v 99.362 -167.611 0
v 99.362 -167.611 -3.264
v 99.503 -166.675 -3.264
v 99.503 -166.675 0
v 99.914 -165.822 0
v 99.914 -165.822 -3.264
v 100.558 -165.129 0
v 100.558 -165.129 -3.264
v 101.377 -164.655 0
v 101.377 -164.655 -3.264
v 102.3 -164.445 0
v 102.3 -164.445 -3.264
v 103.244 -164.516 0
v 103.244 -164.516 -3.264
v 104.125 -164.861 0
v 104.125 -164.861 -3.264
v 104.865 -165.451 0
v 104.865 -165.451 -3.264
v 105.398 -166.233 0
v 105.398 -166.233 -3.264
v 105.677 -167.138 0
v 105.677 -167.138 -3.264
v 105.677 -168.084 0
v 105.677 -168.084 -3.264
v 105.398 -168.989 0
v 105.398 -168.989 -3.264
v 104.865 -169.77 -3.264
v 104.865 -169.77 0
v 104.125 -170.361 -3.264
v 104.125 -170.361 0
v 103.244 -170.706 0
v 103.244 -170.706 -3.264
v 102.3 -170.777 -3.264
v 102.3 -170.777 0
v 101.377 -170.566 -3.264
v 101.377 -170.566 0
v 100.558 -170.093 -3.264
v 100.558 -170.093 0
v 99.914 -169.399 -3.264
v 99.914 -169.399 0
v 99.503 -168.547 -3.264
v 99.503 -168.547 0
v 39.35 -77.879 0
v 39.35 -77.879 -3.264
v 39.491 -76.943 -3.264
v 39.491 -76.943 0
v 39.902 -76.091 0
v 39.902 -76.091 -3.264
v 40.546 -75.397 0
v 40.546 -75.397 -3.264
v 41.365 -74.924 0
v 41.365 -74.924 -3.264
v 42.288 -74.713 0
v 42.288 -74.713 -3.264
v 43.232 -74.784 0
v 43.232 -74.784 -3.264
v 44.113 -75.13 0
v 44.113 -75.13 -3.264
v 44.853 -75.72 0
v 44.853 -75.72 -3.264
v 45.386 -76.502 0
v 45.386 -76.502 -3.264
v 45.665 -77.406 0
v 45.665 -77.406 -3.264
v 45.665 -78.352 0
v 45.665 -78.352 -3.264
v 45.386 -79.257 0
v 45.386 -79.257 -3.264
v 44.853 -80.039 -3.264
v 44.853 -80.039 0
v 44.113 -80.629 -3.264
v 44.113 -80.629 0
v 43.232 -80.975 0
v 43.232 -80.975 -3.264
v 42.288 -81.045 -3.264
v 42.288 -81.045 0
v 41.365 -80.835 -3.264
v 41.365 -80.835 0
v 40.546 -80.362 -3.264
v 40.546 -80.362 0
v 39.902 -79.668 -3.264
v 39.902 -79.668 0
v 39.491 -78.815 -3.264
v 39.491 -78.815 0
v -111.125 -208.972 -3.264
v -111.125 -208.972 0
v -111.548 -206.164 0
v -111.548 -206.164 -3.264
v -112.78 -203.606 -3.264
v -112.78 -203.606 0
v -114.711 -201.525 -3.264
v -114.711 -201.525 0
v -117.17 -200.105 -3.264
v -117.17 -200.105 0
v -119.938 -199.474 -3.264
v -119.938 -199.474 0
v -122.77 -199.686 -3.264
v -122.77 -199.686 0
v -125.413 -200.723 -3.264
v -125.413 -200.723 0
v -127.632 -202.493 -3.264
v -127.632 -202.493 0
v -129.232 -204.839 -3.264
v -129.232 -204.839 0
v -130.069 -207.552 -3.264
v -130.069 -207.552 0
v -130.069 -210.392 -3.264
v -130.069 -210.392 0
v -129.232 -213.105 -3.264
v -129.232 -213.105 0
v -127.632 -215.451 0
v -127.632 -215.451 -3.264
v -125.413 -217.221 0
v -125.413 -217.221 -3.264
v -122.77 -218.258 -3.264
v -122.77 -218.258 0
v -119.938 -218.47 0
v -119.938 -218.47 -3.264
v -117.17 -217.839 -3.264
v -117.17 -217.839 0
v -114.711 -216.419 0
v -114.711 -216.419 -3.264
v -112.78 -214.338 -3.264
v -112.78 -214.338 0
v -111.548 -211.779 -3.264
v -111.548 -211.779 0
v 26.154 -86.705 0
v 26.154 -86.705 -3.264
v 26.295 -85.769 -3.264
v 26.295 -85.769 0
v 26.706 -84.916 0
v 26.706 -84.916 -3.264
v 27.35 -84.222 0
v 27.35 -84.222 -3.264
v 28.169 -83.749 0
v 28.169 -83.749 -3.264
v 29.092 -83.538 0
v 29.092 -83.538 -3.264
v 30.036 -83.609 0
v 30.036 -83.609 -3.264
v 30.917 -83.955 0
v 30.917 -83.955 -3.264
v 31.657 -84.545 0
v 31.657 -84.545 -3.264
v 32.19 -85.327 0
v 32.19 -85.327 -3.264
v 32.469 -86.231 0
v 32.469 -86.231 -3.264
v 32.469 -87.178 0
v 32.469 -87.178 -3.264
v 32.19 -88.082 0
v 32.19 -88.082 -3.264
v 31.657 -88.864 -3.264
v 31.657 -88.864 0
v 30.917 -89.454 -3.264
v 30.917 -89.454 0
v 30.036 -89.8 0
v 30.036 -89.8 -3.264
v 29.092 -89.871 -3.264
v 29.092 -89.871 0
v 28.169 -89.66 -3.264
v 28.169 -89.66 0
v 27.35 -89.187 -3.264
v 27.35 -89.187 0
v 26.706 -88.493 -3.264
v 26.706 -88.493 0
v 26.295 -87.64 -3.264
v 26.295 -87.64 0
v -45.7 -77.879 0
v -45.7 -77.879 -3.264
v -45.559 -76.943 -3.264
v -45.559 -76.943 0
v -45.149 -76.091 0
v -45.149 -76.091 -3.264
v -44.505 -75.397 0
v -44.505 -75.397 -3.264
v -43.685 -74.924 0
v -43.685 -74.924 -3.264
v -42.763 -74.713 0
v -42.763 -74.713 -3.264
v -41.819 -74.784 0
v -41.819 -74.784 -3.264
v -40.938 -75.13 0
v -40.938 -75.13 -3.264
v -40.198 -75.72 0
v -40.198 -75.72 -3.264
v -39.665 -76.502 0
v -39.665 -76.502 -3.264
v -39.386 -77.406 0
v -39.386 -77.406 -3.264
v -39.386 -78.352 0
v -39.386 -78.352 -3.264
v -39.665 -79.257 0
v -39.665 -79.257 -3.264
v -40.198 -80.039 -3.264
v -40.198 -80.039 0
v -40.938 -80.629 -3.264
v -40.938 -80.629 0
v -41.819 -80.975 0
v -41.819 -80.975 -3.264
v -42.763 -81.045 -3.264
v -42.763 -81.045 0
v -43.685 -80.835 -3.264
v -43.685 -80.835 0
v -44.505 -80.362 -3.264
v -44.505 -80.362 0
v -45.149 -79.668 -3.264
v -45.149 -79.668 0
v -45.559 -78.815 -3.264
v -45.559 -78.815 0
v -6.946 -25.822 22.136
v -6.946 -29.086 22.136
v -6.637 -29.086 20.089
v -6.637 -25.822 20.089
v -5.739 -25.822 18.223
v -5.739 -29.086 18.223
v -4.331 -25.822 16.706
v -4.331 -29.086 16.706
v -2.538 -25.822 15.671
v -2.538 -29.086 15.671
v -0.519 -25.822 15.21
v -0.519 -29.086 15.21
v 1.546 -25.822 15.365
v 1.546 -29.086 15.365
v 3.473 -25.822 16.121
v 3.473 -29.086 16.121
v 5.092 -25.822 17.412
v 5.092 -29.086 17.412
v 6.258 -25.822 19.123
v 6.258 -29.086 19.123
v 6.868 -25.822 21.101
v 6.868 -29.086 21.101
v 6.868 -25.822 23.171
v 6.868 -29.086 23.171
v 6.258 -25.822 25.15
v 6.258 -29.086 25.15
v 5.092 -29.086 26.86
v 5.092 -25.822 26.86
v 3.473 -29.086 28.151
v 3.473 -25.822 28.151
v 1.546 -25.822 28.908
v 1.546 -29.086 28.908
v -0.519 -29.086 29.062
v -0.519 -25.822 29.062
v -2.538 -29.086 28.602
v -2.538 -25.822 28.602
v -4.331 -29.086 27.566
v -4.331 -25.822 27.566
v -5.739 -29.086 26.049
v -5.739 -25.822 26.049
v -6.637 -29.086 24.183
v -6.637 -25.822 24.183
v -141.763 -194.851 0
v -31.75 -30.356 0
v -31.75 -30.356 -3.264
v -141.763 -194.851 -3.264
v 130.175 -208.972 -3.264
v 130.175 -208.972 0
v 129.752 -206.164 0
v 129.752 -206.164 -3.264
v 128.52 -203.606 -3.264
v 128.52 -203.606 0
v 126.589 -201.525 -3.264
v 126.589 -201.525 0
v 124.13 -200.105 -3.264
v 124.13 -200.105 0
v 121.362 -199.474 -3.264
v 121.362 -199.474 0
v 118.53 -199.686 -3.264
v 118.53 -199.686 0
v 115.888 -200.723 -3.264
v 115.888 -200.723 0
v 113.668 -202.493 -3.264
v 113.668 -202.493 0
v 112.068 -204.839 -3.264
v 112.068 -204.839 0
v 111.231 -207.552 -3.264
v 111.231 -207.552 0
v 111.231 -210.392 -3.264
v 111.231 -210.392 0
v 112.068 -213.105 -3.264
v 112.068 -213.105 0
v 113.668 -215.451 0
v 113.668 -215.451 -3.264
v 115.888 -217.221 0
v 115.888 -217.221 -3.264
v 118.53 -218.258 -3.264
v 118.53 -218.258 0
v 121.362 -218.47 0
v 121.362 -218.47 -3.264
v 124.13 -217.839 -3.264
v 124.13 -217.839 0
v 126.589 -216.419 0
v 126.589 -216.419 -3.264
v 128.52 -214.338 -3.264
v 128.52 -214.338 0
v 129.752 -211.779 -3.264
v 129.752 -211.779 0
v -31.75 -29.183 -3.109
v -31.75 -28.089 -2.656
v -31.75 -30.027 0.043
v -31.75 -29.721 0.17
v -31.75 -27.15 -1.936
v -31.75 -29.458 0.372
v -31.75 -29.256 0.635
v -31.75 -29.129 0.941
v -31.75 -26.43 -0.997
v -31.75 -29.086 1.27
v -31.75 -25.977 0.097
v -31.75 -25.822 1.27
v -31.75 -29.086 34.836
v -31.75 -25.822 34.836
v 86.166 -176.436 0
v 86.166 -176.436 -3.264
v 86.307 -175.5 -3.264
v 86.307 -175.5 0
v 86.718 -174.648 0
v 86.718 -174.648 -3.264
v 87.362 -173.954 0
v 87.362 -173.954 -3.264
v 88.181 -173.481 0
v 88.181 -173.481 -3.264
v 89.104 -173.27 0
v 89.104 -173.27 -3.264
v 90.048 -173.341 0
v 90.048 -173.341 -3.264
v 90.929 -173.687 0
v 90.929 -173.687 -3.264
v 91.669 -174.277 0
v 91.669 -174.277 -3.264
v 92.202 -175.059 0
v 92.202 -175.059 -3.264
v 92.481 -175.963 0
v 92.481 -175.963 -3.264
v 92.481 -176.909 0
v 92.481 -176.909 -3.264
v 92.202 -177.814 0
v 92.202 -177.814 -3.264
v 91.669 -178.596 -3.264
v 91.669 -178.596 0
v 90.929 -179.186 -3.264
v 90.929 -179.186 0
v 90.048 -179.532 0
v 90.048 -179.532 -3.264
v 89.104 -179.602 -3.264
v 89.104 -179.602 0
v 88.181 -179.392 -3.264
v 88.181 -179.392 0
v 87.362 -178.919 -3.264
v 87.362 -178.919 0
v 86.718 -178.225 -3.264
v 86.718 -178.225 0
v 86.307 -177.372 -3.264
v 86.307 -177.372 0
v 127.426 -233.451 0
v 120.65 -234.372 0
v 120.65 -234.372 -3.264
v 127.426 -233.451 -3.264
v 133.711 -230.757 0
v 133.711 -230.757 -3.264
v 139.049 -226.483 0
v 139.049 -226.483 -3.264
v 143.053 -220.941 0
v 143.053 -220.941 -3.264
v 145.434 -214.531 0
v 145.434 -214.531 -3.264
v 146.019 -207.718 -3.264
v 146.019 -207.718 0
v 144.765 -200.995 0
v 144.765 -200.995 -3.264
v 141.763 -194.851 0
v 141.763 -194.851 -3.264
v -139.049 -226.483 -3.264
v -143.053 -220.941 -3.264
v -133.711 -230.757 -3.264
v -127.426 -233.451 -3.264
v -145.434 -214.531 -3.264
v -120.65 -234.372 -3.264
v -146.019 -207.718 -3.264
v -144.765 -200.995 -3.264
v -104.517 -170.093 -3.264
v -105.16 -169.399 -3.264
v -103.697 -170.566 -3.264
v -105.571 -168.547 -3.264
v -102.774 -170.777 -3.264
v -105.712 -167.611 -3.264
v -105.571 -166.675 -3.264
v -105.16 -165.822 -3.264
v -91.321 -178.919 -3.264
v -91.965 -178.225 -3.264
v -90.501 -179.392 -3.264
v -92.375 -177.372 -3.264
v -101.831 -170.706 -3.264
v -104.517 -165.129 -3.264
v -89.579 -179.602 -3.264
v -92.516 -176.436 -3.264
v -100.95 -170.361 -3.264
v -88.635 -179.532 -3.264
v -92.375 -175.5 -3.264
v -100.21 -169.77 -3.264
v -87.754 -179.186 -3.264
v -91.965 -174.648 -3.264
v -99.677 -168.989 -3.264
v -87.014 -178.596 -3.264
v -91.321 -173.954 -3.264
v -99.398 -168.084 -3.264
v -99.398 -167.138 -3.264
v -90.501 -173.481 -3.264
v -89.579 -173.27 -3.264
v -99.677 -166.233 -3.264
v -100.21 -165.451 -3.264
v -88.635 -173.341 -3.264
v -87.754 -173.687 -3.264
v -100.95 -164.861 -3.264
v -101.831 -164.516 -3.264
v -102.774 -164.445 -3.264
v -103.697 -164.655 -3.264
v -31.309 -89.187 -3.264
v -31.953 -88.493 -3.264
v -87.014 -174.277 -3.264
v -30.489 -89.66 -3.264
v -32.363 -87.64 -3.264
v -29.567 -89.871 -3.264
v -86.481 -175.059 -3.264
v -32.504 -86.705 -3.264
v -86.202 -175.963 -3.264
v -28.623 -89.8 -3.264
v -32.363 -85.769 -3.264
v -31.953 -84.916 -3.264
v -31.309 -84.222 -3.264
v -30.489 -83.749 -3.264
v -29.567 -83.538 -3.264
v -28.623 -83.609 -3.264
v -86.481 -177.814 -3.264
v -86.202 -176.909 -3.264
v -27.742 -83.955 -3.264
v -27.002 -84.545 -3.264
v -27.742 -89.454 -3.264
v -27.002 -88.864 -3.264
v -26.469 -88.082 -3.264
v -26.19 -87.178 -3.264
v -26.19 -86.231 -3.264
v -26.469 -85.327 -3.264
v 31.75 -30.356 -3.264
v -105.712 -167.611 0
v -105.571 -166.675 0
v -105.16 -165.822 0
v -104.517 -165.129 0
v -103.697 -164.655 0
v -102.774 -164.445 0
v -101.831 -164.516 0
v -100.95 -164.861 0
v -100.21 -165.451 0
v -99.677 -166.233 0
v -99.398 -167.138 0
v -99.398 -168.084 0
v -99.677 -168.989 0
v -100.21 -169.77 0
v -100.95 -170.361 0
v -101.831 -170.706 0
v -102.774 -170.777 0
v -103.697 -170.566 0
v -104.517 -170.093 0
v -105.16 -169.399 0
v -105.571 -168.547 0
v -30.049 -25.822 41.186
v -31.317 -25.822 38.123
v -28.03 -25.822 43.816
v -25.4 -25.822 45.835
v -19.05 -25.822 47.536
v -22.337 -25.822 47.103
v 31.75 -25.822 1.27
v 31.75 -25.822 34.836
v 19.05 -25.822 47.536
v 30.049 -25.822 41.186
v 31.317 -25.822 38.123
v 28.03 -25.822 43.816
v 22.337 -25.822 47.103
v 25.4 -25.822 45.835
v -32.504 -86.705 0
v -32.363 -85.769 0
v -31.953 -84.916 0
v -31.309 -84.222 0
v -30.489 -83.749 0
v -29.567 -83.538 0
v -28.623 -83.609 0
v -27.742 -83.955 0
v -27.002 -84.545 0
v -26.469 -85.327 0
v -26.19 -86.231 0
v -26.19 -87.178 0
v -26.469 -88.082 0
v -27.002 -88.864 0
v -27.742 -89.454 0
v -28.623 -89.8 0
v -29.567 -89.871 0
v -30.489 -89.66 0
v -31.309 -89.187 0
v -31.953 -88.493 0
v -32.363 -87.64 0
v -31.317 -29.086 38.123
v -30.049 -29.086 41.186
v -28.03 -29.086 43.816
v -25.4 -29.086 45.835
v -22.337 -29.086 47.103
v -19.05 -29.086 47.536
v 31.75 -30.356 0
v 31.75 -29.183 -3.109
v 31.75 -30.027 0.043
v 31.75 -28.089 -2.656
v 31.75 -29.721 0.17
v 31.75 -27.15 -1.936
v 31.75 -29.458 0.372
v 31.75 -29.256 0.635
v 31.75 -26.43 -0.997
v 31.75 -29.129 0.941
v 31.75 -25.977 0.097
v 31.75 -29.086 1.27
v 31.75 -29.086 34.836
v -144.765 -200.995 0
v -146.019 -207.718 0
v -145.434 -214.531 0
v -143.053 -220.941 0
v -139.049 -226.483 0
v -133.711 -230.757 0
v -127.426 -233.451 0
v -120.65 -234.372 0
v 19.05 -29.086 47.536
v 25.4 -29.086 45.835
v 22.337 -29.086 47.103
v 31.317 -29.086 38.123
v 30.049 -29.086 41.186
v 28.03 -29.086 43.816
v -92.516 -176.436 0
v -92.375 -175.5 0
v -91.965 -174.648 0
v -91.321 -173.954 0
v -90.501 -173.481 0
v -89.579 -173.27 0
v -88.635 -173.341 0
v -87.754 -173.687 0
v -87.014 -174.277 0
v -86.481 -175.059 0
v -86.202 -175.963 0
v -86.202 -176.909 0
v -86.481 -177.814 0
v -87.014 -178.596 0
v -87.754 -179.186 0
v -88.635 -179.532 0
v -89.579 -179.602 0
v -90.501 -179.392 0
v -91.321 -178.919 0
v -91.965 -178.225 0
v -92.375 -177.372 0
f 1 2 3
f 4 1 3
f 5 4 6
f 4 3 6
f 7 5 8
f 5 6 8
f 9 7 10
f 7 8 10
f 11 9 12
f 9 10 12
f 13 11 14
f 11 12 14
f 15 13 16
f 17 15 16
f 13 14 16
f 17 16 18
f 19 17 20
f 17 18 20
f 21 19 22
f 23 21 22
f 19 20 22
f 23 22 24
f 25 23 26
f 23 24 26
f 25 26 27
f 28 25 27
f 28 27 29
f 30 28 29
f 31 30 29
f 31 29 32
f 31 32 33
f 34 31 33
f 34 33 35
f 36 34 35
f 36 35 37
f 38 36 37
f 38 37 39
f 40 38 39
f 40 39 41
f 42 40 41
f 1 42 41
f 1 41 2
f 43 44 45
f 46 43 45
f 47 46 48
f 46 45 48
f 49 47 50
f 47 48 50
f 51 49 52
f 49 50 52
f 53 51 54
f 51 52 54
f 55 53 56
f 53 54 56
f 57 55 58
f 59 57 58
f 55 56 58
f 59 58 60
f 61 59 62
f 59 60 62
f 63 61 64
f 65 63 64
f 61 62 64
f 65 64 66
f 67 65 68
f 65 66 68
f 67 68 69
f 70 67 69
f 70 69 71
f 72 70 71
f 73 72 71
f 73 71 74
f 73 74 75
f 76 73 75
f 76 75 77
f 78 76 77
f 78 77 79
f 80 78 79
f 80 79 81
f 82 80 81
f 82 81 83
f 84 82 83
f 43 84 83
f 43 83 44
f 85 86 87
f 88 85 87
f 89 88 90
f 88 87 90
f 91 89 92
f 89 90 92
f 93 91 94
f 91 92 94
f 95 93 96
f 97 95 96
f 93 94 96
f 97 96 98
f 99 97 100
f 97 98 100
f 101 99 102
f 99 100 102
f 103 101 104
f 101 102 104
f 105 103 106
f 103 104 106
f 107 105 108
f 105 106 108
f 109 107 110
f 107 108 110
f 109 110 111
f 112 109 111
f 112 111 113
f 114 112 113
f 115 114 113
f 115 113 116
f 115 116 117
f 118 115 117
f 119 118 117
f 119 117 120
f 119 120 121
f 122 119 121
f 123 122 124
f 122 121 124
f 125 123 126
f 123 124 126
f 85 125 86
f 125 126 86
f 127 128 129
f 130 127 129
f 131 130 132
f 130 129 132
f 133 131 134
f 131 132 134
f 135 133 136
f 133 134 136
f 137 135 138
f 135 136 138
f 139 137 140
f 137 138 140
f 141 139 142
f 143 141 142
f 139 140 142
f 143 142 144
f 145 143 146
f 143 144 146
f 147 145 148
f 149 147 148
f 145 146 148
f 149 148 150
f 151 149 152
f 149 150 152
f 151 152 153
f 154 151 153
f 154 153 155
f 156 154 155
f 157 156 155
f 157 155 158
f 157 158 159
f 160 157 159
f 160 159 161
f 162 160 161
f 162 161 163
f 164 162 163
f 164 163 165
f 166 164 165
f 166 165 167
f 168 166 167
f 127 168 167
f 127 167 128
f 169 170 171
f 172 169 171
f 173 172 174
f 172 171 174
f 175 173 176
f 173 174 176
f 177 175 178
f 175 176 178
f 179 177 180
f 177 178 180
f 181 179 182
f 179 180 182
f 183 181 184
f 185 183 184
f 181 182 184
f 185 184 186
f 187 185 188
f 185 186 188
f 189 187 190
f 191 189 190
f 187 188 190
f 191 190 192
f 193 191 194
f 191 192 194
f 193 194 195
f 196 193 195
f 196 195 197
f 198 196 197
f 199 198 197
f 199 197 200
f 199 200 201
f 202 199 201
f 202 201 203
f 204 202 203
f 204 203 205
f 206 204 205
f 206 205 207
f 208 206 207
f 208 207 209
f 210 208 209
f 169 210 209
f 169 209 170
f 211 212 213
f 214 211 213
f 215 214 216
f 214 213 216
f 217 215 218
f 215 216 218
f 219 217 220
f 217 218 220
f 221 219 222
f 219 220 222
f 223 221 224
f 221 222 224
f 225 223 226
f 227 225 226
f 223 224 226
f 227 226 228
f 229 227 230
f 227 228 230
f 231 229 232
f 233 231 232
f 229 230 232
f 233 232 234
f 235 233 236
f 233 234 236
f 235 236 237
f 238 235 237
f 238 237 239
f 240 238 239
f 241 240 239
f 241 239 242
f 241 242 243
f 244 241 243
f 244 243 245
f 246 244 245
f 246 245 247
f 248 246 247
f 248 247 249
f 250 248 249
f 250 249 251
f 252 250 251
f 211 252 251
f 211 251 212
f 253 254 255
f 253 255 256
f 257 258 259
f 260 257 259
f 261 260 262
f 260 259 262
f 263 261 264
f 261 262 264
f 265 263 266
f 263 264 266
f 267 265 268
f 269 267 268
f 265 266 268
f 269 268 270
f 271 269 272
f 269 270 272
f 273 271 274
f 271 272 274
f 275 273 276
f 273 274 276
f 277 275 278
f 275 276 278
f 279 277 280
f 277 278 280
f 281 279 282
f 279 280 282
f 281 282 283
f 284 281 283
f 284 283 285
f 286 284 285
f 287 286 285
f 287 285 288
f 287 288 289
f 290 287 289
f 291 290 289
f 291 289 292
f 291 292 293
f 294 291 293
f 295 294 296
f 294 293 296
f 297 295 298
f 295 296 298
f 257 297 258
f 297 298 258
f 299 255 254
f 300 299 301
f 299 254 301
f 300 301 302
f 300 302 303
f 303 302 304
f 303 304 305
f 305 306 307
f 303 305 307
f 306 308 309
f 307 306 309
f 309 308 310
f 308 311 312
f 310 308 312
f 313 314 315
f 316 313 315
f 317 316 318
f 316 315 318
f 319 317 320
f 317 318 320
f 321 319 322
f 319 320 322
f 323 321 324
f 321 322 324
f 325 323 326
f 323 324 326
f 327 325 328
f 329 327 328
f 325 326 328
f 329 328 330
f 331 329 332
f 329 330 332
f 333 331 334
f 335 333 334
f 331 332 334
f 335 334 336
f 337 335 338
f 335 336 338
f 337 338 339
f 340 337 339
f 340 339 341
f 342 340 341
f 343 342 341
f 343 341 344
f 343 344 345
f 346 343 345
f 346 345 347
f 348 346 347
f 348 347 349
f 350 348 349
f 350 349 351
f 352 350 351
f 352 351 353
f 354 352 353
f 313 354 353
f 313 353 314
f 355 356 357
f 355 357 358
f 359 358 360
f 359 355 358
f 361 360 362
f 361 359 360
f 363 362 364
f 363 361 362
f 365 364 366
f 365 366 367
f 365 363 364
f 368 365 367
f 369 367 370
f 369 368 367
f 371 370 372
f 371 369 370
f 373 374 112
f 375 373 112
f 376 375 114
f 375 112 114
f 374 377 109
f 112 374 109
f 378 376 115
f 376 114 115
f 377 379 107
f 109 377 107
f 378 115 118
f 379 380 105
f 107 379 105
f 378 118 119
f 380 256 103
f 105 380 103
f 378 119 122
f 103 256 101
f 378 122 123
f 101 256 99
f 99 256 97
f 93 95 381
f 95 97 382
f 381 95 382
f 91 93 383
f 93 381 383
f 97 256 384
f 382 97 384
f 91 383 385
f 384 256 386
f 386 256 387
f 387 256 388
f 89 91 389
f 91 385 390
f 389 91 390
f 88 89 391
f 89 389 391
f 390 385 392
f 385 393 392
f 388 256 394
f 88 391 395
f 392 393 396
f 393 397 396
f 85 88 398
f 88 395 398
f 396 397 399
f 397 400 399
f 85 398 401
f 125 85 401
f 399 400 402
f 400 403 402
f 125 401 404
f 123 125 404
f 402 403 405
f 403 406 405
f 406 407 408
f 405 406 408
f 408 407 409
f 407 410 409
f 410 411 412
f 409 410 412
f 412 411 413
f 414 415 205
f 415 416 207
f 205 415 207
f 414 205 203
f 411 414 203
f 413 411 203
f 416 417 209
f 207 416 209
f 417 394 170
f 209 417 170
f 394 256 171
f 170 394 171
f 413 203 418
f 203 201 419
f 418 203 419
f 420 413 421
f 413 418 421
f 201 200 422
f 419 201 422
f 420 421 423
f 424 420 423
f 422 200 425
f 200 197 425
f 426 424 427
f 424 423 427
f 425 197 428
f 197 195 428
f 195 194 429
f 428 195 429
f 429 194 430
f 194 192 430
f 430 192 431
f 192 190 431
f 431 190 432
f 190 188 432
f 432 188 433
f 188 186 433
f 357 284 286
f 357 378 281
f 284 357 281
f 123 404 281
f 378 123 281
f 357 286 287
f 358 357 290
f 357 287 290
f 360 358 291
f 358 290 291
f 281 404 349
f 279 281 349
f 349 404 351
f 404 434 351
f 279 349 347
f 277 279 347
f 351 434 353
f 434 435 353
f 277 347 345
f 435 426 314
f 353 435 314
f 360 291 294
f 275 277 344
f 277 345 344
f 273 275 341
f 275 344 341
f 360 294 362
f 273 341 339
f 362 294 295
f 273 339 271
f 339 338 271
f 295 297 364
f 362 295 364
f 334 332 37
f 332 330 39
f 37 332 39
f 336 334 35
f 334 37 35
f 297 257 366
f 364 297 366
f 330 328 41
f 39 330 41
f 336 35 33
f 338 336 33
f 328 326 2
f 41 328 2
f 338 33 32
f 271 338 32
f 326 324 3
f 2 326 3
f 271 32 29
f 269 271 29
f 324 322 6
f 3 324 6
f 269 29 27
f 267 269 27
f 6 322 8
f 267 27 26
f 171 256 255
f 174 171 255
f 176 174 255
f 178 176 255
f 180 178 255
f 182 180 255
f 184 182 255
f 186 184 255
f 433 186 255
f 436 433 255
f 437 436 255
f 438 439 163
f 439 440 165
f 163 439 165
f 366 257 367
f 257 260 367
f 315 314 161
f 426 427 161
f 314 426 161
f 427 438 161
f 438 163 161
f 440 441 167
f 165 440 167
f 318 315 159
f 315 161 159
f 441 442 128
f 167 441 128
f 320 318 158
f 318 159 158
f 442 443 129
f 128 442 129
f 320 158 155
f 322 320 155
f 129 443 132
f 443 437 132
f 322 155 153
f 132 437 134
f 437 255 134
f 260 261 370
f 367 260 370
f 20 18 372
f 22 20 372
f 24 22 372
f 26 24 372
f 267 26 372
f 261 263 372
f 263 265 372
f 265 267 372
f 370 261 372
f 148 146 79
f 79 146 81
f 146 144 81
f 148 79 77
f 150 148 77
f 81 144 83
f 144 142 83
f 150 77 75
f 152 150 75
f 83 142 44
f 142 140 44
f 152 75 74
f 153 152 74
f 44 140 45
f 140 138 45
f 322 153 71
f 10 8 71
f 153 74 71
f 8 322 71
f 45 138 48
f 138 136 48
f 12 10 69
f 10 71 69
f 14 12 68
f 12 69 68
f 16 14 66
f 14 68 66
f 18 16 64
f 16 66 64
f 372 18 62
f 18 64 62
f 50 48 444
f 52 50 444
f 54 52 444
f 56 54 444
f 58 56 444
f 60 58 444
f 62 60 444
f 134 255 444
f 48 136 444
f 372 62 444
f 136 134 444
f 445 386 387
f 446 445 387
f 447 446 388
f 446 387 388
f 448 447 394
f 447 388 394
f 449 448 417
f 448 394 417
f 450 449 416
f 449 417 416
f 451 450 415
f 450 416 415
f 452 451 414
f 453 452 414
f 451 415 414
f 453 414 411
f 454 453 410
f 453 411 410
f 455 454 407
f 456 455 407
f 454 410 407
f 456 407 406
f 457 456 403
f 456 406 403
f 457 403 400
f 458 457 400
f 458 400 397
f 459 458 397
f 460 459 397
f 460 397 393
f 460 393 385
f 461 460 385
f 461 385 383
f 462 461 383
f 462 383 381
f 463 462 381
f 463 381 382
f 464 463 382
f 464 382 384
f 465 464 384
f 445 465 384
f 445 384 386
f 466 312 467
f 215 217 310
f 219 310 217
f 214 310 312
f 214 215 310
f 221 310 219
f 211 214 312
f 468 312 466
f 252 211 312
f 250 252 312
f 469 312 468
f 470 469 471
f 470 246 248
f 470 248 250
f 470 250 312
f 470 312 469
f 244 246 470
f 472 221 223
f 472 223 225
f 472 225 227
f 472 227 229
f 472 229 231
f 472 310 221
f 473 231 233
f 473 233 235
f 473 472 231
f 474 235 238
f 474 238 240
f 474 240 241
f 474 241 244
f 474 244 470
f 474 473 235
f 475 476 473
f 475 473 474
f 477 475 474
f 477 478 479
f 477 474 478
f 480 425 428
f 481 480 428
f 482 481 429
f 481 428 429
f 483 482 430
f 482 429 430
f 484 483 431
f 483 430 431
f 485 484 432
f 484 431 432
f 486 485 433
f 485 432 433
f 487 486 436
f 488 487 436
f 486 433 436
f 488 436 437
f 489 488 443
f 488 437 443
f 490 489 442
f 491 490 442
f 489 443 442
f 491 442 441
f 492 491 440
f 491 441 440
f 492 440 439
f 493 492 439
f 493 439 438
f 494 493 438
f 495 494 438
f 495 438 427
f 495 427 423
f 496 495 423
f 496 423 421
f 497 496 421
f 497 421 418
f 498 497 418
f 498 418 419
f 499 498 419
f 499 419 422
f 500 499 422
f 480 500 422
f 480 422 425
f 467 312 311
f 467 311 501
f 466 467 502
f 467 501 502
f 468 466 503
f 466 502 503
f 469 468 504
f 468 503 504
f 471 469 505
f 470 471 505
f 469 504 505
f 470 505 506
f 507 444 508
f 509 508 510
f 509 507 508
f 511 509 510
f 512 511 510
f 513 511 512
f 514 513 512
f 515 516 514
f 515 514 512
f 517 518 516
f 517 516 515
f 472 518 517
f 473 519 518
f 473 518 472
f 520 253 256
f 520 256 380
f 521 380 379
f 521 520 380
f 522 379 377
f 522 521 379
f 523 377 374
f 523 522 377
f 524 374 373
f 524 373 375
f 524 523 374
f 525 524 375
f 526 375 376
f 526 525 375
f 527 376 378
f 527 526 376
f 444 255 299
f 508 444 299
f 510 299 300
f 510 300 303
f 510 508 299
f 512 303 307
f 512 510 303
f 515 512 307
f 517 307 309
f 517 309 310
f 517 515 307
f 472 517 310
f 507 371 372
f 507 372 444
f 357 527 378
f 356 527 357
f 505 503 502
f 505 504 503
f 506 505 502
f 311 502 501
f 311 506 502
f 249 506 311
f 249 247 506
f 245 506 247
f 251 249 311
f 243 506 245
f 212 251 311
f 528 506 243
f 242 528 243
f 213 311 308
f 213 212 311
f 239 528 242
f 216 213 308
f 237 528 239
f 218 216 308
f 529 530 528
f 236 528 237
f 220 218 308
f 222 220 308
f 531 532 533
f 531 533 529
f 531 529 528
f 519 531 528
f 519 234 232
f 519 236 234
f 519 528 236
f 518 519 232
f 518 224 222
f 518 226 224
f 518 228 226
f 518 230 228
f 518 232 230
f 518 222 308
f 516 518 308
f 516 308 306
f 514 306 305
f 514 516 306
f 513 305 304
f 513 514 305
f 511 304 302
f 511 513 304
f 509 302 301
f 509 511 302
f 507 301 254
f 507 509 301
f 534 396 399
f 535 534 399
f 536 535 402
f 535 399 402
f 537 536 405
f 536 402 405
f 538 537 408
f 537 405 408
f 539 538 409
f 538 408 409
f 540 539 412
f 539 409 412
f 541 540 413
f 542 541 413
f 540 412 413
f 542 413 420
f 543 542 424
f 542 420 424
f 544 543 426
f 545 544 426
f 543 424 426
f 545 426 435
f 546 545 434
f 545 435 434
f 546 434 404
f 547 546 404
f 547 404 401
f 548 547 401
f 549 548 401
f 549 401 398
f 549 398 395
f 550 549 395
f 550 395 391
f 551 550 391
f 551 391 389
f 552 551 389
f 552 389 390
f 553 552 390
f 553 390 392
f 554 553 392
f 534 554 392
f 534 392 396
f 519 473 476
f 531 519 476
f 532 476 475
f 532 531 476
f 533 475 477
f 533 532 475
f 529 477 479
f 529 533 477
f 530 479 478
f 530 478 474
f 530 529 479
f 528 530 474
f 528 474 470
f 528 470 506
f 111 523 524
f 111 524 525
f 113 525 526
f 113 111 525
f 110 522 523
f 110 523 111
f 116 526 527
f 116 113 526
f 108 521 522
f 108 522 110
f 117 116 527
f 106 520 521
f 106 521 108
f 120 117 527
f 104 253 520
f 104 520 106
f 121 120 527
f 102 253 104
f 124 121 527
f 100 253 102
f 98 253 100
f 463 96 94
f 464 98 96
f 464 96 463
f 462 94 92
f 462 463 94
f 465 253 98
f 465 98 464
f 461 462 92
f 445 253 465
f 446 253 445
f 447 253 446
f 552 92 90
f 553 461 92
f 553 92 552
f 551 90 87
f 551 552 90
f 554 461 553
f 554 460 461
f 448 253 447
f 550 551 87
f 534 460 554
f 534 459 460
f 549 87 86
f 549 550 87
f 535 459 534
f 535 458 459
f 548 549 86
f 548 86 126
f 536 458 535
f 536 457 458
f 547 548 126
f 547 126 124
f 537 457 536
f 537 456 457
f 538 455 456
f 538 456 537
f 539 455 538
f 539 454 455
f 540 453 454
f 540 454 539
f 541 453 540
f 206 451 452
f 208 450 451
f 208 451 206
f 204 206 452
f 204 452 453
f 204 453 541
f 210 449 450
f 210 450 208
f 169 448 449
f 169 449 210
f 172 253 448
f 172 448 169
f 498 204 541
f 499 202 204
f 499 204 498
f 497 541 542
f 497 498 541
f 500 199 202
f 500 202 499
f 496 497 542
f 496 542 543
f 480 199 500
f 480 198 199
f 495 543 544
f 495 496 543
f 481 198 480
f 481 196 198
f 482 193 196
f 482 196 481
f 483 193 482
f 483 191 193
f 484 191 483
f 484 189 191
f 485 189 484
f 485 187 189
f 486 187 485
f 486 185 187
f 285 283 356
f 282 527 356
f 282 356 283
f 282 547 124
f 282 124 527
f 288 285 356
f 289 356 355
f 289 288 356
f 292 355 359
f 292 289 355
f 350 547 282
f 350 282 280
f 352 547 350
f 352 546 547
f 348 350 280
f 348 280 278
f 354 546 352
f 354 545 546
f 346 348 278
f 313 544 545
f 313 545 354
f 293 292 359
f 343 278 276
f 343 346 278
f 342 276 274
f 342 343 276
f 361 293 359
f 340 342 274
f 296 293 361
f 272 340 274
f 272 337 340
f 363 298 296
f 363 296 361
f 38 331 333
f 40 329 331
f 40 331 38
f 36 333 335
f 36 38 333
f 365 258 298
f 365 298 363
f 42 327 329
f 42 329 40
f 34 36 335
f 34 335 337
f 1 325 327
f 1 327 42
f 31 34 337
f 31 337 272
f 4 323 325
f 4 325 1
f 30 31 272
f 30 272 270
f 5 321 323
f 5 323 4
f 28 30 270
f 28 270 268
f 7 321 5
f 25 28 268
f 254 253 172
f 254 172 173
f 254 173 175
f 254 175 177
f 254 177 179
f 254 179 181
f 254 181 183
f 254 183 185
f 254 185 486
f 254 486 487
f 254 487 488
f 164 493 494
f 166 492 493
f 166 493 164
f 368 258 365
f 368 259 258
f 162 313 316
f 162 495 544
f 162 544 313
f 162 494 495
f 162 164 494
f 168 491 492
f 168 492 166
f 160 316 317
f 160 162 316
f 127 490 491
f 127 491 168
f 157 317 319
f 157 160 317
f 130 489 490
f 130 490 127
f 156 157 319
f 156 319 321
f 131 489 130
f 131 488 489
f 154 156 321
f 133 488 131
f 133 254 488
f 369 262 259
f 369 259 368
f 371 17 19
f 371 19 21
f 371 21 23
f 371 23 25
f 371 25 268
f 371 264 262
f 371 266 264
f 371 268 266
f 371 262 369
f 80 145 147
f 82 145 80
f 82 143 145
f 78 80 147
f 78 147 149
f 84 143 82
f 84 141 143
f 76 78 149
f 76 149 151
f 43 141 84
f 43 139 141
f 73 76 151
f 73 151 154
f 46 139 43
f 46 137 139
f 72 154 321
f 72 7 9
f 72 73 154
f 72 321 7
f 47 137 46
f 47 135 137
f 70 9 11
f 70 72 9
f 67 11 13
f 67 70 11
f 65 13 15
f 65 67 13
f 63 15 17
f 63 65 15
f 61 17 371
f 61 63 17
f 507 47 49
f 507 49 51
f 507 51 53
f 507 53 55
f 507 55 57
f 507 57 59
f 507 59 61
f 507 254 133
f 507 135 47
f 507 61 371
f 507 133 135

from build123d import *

# Parameters (mm, degrees)
SKETCH_S_R                 = 9.525
BASE_FLANGE1_DEPTH         = 3.2639
F_1_4_0_2500_DOWEL_HOLE2_D = 6.35
EDGE_FLANGE1_DEPTH         = 63.5
F_1_2_CLEARANCE_HOLE1_D    = 13.89126
FILLET1_R                  = 12.7


# Sheet-metal steps are written as plain solids
with BuildPart() as part:
    # s → Base-Flange1 (new body)
    with BuildSketch(Plane.XY):
        with BuildLine():
            Line((31.75, -30.356048), (-31.75, -30.356048))
            Line((-31.75, -30.356048), (-141.763337817, -194.851484961))
            ThreePointArc((-141.763337817, -194.851484961), (-143.053340178, -220.94065371), (-120.65, -234.371929933))
            Line((-120.65, -234.371929933), (120.65, -234.371929933))
            ThreePointArc((120.65, -234.371929933), (143.053340178, -220.94065371), (141.763337817, -194.851484961))
            Line((141.763337817, -194.851484961), (31.75, -30.356048))
        make_face()
        with Locations((-120.65, -208.971929933)):
            Circle(SKETCH_S_R, mode=Mode.SUBTRACT)
        with Locations((120.65, -208.971929933)):
            Circle(SKETCH_S_R, mode=Mode.SUBTRACT)
    extrude(amount=-BASE_FLANGE1_DEPTH)

    # 1/4 (0.2500) Dowel Hole2 (through all)
    with Locations(Plane.XY):
        with Locations((-102.537139367, -167.610949699), (-89.341303231, -176.436227806), (-42.525248236, -77.879263975), (-29.3294121, -86.704542082), (29.3294121, -86.704542082), (42.525248236, -77.879263975), (89.341303231, -176.436227806), (102.537139367, -167.610949699)):
            Hole(F_1_4_0_2500_DOWEL_HOLE2_D / 2)

    # Edge-Flange1 section (across the edge) → Edge-Flange1 (add)
    with BuildSketch(Plane(origin=(31.75, -29.086048, 0), x_dir=(0, -1, 0), z_dir=(-1, 0, 0))):
        with BuildLine():
            Line((-3.2639, 1.27), (-3.2639, 47.5361))
            Line((-3.2639, 47.5361), (0, 47.5361))
            Line((0, 47.5361), (0, 1.27))
            ThreePointArc((0, 1.27), (0.371974388, 0.371974388), (1.27, 0))
            Line((1.27, 0), (1.27, -3.2639))
            ThreePointArc((1.27, -3.2639), (-1.935951435, -1.935951435), (-3.2639, 1.27))
        make_face()
    extrude(amount=EDGE_FLANGE1_DEPTH)

    # 1/2 Clearance Hole1 (through all)
    with Locations(Plane(origin=(0, -25.822148, 0), x_dir=(1, 0, 0), z_dir=(0, 1, 0))):
        with Locations((0, -22.1361)):
            Hole(F_1_2_CLEARANCE_HOLE1_D / 2)

    # Fillet1
    fillet1_edges = [part.edges().sort_by_distance(p)[0] for p in [
        (31.75, -27.454098, 47.5361),
        (-31.75, -27.454098, 47.5361),
    ]]
    fillet(fillet1_edges, radius=FILLET1_R)


solid = part.part
